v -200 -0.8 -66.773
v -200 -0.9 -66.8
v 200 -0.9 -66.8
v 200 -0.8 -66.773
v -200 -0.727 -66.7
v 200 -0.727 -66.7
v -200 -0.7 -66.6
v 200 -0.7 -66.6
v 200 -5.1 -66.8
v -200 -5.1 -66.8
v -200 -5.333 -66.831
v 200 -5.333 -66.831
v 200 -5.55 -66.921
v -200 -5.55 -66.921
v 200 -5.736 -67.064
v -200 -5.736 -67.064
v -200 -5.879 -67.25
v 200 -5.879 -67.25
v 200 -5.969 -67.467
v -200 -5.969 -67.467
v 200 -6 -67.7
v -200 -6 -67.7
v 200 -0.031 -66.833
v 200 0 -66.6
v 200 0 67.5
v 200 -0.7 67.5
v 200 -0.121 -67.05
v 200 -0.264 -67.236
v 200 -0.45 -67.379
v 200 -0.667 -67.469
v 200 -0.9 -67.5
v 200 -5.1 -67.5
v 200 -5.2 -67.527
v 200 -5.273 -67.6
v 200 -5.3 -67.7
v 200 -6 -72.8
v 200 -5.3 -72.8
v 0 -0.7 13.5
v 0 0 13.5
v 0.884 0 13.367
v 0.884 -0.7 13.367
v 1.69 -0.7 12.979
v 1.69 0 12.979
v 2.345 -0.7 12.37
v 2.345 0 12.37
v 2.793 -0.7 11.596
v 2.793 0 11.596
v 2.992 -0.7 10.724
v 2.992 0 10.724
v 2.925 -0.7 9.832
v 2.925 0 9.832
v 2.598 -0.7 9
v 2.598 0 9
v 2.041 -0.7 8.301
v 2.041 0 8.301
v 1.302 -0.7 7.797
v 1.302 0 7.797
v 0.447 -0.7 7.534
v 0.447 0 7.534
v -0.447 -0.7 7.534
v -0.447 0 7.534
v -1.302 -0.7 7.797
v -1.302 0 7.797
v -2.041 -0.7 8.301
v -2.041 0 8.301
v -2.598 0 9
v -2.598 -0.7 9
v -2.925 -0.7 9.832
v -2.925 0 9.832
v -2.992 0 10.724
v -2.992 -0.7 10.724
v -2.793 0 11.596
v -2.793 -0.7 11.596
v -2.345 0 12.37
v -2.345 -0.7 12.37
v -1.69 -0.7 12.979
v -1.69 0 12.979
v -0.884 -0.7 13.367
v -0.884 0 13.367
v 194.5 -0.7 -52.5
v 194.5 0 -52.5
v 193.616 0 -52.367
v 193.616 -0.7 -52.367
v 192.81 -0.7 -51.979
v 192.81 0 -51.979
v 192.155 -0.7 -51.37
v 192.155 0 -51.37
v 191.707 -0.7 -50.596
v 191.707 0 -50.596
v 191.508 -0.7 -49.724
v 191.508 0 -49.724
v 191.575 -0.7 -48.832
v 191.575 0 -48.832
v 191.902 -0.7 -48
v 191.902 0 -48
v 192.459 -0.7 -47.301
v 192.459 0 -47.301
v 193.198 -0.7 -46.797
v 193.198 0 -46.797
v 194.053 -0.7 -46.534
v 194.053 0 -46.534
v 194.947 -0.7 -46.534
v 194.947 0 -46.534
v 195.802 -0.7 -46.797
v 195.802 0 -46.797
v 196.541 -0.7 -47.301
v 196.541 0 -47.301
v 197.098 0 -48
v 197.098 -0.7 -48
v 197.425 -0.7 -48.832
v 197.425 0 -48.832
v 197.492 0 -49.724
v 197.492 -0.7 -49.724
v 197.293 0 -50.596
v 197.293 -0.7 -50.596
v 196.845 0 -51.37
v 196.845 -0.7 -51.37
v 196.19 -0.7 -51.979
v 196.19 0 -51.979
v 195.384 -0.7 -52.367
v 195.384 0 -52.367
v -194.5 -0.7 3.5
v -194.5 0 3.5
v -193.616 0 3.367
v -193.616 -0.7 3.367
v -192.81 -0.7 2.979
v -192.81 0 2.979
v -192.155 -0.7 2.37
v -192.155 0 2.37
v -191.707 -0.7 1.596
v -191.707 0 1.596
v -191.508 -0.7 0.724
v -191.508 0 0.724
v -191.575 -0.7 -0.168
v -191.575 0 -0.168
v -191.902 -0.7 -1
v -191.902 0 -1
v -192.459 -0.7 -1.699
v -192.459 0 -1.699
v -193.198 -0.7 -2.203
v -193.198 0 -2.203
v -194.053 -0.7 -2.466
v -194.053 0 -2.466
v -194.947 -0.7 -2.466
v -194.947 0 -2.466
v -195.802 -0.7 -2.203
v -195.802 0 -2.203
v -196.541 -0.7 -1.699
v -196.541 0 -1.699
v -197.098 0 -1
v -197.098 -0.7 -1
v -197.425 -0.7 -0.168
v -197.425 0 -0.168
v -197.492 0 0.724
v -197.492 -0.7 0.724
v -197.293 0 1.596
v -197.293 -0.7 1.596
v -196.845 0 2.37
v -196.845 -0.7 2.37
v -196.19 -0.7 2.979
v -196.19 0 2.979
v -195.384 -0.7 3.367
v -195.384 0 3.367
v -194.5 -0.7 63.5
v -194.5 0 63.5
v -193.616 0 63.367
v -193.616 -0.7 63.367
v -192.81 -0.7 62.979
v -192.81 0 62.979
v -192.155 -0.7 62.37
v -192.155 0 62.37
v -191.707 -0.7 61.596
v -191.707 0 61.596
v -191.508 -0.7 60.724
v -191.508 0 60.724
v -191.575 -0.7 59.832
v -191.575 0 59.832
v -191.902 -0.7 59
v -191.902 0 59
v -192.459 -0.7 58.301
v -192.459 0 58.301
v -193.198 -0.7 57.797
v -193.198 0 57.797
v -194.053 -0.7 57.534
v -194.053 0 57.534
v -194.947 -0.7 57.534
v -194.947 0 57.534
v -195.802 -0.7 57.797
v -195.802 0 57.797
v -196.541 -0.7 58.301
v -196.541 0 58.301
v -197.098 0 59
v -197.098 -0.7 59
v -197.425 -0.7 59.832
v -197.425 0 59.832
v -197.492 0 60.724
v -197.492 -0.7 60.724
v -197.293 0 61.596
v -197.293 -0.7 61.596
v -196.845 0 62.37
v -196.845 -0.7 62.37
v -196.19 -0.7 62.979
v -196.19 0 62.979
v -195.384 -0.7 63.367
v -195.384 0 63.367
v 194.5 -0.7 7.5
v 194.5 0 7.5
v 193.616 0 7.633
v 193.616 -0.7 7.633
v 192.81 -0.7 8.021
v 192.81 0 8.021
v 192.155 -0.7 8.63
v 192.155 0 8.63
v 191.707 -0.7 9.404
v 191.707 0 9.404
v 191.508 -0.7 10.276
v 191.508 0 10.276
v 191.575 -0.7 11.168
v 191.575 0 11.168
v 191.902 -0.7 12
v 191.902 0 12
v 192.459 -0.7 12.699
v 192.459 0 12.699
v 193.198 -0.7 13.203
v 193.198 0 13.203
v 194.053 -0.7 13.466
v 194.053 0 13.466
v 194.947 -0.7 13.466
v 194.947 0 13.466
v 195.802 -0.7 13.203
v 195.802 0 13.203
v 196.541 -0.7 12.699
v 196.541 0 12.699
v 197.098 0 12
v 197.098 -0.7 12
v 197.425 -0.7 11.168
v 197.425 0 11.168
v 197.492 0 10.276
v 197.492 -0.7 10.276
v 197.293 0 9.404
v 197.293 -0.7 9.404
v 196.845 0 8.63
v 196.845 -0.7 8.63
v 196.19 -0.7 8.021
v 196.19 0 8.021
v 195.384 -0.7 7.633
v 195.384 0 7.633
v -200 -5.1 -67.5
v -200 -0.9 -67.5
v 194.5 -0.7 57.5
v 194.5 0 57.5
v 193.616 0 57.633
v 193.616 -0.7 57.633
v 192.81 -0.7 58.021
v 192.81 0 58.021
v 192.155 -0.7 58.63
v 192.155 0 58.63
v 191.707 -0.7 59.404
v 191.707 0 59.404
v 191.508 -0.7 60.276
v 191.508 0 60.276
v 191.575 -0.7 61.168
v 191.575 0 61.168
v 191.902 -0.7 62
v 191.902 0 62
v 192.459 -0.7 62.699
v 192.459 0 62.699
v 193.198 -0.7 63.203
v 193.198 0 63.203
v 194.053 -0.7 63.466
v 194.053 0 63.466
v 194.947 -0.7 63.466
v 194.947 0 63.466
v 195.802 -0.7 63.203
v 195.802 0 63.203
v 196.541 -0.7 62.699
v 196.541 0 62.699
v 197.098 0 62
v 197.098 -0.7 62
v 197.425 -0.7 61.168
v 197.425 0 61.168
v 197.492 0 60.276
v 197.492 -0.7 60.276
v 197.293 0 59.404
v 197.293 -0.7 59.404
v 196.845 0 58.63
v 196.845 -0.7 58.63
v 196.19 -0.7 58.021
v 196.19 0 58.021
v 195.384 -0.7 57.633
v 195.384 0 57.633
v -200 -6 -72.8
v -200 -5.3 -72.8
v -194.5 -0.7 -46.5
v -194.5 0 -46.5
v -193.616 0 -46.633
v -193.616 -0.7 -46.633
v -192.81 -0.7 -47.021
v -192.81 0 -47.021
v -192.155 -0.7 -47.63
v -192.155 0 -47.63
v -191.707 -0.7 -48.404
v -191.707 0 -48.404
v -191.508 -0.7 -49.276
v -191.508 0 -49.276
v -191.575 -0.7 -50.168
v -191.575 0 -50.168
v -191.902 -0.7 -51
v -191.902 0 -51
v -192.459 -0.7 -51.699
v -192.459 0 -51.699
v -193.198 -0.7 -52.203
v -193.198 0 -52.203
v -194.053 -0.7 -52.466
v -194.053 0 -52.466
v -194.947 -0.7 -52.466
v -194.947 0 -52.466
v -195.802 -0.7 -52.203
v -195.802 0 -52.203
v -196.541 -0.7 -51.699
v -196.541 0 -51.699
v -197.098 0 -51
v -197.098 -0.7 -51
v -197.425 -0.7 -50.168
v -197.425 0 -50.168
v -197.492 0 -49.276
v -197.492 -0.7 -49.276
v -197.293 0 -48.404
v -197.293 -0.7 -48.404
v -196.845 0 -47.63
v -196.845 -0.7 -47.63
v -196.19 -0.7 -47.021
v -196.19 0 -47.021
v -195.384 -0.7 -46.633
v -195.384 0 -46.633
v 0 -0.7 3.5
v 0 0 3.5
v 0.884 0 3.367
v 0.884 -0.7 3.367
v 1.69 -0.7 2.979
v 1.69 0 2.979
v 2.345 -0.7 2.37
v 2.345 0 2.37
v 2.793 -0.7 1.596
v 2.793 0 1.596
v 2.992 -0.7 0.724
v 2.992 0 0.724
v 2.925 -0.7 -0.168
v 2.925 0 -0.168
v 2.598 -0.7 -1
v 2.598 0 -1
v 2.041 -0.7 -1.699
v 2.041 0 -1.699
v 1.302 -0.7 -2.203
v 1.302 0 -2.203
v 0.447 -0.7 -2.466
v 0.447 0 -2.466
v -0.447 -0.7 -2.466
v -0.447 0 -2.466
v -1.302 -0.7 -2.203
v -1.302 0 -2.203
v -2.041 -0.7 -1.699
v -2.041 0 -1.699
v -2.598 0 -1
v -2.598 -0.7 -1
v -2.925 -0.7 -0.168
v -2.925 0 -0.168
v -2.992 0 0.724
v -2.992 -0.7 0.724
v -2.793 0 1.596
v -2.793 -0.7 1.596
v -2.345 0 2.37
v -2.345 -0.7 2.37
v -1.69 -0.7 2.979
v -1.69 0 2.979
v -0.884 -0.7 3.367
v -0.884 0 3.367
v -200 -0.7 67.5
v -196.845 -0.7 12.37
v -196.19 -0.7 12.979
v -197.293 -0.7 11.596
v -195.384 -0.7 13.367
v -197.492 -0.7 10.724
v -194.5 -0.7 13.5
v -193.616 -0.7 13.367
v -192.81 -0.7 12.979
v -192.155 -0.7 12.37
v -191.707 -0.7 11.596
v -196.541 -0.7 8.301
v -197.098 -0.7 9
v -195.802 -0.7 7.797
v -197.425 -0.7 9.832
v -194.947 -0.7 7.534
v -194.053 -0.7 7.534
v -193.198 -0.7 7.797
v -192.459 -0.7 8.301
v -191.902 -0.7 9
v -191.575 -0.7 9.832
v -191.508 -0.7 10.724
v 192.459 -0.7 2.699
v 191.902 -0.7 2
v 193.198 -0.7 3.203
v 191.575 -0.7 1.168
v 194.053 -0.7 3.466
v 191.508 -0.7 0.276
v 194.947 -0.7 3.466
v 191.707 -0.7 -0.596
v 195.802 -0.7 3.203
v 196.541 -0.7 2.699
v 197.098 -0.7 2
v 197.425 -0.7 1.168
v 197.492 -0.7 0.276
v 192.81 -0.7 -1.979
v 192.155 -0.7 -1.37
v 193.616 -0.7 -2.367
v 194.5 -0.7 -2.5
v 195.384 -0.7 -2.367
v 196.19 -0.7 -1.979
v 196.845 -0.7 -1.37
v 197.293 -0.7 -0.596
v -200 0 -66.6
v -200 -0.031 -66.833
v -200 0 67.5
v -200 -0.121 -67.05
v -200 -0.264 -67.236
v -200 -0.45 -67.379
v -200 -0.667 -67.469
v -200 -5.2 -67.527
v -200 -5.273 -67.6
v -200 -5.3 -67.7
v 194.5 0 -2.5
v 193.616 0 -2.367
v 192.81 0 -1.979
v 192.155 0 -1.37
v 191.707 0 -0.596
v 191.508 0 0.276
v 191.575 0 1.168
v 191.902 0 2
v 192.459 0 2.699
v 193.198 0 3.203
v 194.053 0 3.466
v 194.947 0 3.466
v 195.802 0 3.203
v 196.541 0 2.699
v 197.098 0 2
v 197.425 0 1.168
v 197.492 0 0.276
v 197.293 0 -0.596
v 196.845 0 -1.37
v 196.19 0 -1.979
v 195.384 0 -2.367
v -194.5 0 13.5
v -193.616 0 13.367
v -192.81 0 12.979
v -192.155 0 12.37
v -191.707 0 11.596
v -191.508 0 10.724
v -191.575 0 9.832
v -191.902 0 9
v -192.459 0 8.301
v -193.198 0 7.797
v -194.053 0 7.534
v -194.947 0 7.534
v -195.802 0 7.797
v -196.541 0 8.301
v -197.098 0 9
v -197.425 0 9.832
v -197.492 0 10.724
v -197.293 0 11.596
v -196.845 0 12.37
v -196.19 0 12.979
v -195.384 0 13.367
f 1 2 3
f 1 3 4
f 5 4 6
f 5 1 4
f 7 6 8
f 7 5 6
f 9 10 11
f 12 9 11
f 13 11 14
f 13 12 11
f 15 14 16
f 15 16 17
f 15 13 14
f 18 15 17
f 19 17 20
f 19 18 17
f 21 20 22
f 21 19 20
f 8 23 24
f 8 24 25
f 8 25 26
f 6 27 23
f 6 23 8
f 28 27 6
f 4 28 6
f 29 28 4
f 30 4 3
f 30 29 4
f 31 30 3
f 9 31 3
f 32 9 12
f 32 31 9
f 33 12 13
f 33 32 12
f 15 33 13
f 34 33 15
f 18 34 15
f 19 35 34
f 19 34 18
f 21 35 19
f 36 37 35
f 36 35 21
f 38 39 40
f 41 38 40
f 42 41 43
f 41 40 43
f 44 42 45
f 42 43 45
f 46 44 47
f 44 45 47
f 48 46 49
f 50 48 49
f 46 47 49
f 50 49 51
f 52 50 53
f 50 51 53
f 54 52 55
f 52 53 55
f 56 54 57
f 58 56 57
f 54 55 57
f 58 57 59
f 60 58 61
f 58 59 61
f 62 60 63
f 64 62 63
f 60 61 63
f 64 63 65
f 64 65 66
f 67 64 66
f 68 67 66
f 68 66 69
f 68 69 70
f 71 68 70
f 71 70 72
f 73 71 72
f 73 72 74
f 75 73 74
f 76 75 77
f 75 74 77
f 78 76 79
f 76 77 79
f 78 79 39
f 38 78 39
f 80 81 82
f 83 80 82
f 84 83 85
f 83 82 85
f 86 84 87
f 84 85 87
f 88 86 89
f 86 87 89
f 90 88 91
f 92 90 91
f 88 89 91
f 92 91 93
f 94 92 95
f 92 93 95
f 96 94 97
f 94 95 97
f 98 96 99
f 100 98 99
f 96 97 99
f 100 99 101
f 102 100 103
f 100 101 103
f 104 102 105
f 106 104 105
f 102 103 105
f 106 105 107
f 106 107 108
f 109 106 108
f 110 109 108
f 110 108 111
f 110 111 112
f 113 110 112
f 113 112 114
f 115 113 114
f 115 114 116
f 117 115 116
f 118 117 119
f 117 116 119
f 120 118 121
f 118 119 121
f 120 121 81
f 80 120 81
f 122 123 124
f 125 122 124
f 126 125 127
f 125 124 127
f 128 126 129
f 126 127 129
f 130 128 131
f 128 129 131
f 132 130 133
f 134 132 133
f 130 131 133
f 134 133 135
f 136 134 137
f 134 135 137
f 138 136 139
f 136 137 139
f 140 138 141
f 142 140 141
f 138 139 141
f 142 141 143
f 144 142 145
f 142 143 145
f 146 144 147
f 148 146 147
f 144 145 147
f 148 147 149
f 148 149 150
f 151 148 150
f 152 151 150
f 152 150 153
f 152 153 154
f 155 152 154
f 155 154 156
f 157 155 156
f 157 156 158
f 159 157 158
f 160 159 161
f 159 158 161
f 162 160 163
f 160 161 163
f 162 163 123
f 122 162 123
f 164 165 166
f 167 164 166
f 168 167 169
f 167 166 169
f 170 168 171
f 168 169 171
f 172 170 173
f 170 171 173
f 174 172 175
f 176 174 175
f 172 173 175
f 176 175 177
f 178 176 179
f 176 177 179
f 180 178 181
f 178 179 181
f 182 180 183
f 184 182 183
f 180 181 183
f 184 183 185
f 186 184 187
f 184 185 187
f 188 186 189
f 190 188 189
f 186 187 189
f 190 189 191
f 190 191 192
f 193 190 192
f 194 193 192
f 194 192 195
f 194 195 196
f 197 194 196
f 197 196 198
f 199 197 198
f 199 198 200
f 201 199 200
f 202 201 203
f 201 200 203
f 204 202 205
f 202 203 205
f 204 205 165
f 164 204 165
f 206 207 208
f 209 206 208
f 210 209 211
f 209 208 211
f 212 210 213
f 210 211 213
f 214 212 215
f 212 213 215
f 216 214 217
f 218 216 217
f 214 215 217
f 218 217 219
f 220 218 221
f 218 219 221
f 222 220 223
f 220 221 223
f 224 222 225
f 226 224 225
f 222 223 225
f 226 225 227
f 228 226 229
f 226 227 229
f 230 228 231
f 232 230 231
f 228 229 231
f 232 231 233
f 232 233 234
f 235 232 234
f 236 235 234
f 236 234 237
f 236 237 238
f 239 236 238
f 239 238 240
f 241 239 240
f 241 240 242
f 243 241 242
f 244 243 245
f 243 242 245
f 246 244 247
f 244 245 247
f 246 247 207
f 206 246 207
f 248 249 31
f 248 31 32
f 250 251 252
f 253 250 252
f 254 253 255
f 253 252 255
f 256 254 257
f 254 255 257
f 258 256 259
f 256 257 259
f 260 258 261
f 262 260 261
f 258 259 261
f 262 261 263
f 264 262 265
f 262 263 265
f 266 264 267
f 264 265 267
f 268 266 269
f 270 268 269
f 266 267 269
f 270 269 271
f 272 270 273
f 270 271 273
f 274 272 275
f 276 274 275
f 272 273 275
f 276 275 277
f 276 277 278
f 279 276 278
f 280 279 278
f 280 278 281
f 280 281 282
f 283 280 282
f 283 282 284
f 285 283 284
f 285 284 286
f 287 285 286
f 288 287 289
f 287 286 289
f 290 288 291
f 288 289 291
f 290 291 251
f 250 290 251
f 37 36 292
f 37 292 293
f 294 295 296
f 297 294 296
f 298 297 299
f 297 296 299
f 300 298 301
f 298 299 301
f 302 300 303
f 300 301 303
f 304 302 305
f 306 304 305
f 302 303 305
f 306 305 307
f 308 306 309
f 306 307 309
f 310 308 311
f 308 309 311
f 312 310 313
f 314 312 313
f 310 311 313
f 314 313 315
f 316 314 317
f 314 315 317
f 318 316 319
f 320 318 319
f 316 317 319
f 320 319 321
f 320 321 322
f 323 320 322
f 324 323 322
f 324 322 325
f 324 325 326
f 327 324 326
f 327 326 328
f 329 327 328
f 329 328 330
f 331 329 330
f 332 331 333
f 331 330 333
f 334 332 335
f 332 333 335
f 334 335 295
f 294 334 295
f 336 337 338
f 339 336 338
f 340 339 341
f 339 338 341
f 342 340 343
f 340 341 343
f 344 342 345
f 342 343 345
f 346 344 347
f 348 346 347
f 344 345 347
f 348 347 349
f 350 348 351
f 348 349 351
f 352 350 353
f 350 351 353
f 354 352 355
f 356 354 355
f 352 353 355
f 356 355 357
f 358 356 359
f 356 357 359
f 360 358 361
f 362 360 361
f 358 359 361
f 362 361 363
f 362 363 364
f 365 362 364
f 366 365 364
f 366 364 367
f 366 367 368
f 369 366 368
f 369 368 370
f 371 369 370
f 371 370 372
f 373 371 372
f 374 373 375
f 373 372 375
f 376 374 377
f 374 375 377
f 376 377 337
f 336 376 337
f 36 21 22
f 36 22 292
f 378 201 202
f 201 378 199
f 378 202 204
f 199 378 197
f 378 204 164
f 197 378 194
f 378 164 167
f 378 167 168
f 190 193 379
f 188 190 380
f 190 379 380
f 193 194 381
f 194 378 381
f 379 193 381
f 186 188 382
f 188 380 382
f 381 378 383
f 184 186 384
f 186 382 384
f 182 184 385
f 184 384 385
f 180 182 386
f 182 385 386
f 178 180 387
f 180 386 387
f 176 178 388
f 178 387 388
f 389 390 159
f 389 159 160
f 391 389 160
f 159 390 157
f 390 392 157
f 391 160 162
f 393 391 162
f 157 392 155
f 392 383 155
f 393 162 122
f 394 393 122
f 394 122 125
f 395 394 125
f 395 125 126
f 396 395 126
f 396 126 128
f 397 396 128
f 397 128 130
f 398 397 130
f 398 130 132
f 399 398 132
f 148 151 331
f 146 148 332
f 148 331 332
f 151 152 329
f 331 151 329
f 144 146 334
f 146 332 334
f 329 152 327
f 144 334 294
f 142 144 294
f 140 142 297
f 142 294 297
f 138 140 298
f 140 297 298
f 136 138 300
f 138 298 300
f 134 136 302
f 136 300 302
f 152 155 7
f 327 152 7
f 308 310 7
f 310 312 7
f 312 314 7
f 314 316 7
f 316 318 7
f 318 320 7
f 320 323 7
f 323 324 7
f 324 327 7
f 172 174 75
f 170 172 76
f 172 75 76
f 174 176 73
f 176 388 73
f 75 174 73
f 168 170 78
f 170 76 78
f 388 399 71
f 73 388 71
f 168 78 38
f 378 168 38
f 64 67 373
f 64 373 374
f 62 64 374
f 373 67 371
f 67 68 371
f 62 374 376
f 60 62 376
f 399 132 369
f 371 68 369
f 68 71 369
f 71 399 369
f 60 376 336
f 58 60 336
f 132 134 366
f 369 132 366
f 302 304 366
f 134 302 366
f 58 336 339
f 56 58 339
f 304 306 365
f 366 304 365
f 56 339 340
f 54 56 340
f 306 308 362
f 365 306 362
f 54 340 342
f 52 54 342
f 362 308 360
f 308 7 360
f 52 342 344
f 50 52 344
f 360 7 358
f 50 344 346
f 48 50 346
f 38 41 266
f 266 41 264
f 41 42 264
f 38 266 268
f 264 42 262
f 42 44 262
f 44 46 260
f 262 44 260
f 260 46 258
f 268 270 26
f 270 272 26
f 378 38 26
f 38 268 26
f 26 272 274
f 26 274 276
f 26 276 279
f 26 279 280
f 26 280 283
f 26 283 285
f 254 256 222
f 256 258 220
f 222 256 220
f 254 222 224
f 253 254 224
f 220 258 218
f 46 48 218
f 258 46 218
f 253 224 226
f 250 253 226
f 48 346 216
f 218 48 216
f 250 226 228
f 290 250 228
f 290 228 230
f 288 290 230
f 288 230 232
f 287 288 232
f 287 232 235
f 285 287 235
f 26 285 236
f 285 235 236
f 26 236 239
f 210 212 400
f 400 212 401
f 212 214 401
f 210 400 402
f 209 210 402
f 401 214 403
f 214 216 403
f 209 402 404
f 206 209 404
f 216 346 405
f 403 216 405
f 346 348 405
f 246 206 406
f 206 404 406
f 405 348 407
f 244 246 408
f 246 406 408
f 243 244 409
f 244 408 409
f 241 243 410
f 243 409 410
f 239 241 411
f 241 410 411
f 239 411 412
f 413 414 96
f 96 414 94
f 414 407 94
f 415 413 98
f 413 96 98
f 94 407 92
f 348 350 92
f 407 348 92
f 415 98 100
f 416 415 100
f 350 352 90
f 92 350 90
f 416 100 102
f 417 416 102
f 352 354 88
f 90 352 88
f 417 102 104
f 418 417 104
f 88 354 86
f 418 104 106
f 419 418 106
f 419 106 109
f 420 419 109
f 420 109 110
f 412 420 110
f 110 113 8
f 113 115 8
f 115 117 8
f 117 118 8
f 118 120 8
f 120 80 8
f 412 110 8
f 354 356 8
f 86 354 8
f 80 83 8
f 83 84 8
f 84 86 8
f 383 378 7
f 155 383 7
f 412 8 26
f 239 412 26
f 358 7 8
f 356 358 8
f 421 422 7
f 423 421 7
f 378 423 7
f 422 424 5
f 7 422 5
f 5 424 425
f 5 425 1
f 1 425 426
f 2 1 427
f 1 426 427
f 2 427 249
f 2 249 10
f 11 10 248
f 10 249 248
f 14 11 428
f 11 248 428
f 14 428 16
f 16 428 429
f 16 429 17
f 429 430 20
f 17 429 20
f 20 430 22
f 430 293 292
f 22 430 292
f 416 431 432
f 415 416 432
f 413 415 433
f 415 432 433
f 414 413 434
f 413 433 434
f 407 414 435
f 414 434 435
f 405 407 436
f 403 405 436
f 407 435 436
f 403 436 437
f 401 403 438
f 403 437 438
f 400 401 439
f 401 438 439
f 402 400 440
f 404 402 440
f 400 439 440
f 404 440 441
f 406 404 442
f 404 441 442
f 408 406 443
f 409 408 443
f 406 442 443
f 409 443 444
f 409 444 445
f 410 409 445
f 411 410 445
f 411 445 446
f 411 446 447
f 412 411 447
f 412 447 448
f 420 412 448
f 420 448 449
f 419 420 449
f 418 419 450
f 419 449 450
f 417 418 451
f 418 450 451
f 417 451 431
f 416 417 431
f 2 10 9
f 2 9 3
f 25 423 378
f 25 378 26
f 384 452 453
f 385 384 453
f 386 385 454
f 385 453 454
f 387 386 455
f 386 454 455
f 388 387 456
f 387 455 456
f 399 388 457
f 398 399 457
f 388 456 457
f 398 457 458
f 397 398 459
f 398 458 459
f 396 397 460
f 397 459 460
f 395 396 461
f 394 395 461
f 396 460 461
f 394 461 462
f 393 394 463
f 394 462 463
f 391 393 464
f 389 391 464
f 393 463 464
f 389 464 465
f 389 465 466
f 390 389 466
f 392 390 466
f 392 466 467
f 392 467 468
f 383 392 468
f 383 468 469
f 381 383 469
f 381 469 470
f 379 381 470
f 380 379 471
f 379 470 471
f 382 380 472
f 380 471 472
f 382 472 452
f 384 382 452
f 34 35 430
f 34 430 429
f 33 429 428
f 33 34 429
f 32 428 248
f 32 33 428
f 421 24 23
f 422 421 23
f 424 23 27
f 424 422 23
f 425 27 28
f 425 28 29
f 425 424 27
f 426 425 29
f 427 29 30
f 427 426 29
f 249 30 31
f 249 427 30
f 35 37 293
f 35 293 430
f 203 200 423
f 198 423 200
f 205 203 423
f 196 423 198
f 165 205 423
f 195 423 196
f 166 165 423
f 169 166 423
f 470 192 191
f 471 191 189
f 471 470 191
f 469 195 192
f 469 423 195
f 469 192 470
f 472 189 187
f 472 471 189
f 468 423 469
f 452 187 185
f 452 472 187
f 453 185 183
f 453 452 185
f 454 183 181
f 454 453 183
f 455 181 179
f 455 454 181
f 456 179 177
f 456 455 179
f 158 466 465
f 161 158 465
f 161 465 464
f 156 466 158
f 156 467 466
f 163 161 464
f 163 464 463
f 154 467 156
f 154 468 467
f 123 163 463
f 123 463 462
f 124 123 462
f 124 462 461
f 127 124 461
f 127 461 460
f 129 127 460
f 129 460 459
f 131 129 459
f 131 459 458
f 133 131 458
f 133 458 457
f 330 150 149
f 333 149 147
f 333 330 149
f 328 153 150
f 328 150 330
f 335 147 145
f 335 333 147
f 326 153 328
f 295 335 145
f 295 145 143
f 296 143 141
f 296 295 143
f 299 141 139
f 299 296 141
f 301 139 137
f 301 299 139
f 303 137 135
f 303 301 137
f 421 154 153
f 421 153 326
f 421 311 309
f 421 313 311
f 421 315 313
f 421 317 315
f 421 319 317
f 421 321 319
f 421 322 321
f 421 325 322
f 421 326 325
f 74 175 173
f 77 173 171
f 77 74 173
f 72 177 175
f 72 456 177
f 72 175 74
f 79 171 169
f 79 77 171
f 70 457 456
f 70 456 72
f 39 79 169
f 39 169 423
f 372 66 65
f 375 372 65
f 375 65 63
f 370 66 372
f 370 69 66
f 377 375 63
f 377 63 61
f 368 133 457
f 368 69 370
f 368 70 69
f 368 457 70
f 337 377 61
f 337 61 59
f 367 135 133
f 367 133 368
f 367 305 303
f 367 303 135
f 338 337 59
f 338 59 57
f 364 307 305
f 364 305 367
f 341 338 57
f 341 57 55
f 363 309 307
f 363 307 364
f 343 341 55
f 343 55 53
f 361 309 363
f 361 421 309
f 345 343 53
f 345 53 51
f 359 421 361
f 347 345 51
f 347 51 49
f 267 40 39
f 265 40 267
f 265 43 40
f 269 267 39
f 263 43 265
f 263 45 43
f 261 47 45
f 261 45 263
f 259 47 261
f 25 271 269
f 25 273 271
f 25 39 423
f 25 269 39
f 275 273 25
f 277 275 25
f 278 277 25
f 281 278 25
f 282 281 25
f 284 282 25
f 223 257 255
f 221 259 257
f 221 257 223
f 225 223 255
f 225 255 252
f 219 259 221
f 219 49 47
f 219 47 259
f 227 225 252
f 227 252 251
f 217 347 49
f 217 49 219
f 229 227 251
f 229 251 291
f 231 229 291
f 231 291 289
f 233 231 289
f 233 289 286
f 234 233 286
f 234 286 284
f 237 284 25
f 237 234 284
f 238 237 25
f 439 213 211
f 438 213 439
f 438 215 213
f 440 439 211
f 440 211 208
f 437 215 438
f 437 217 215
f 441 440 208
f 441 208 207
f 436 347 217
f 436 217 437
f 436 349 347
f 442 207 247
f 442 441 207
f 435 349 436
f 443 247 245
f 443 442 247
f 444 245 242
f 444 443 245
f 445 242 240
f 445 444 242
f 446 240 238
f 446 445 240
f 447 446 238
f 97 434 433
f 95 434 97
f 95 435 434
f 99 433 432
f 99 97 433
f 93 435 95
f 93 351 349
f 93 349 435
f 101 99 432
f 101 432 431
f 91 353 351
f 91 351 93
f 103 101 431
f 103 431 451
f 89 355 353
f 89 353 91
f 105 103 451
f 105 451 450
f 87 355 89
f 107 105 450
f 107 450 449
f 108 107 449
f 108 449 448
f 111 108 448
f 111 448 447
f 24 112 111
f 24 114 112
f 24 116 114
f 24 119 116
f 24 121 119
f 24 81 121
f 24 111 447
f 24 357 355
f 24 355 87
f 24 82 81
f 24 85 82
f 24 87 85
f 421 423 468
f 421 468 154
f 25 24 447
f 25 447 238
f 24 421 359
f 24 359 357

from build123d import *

# Parameters (mm, degrees)
SKETCH_1_W                       = 400
SKETCH_1_H                       = 135
SKETCH_1_R                       = 3
SM_BASE_FLANGE_1_DEPTH           = 0.7
SM_EDGE_FLANGE_1_STRIP_W         = 3.2
SM_EDGE_FLANGE_1_STRIP_H         = 0.7
SM_EDGE_FLANGE_1_STRIP_CUT_DEPTH = 400
SM_EDGE_FLANGE_1_DEPTH           = 400
SM_EDGE_FLANGE_2_STRIP_W         = 3.2
SM_EDGE_FLANGE_2_STRIP_H         = 0.7
SM_EDGE_FLANGE_2_STRIP_CUT_DEPTH = 400
SM_EDGE_FLANGE_2_DEPTH           = 400


# Sheet-metal steps are written as plain solids
with BuildPart() as part:
    # Sketch 1 → 基体-法兰1 (new body)
    with BuildSketch(Plane(origin=(0, 0, 0), x_dir=(1, 0, 0), z_dir=(0, 1, 0))):
        Rectangle(SKETCH_1_W, SKETCH_1_H)
        with Locations(Location((-194.5, -60.5, 0), (0, 0, 270))):
            Circle(SKETCH_1_R, mode=Mode.SUBTRACT)
        with Locations(Location((-194.5, -10.5, 0), (0, 0, 270))):
            Circle(SKETCH_1_R, mode=Mode.SUBTRACT)
        with Locations(Location((-194.5, -0.5, 0), (0, 0, 270))):
            Circle(SKETCH_1_R, mode=Mode.SUBTRACT)
        with Locations(Location((-194.5, 49.5, 0), (0, 0, 270))):
            Circle(SKETCH_1_R, mode=Mode.SUBTRACT)
        with Locations(Location((0, -10.5, 0), (0, 0, 270))):
            Circle(SKETCH_1_R, mode=Mode.SUBTRACT)
        with Locations(Location((0, -0.5, 0), (0, 0, 270))):
            Circle(SKETCH_1_R, mode=Mode.SUBTRACT)
        with Locations(Location((194.5, -60.5, 0), (0, 0, 90))):
            Circle(SKETCH_1_R, mode=Mode.SUBTRACT)
        with Locations(Location((194.5, -10.5, 0), (0, 0, 90))):
            Circle(SKETCH_1_R, mode=Mode.SUBTRACT)
        with Locations(Location((194.5, -0.5, 0), (0, 0, 90))):
            Circle(SKETCH_1_R, mode=Mode.SUBTRACT)
        with Locations(Location((194.5, 49.5, 0), (0, 0, 90))):
            Circle(SKETCH_1_R, mode=Mode.SUBTRACT)
    extrude(amount=-SM_BASE_FLANGE_1_DEPTH)

    # 边线-法兰1 strip (across the edge) → 边线-法兰1 strip cut (cut)
    with BuildSketch(Plane(origin=(-200, -0.7, -67.5), x_dir=(0, 0, 1), z_dir=(1, 0, 0))):
        with Locations((-0.7, -0.35)):
            Rectangle(SM_EDGE_FLANGE_1_STRIP_W, SM_EDGE_FLANGE_1_STRIP_H)
    extrude(amount=SM_EDGE_FLANGE_1_STRIP_CUT_DEPTH, mode=Mode.SUBTRACT)

    # 边线-法兰1 section (across the edge) → 边线-法兰1 (add)
    with BuildSketch(Plane(origin=(-200, -0.7, -67.5), x_dir=(0, 0, 1), z_dir=(1, 0, 0))):
        with BuildLine():
            Line((0, 0.2), (0, 5.3))
            Line((0, 5.3), (0.7, 5.3))
            Line((0.7, 5.3), (0.7, 0.2))
            ThreePointArc((0.7, 0.2), (0.758578644, 0.058578644), (0.9, 0))
            Line((0.9, 0), (0.9, -0.7))
            ThreePointArc((0.9, -0.7), (0.263603897, -0.436396103), (0, 0.2))
        make_face()
    extrude(amount=SM_EDGE_FLANGE_1_DEPTH)

    # 边线-法兰2 strip (across the edge) → 边线-法兰2 strip cut (cut)
    with BuildSketch(Plane(origin=(200, -6, -67.5), x_dir=(0, 1, 0), z_dir=(-1, 0, 0))):
        with Locations((-0.7, -0.35)):
            Rectangle(SM_EDGE_FLANGE_2_STRIP_W, SM_EDGE_FLANGE_2_STRIP_H)
    extrude(amount=SM_EDGE_FLANGE_2_STRIP_CUT_DEPTH, mode=Mode.SUBTRACT)

    # 边线-法兰2 section (across the edge) → 边线-法兰2 (add)
    with BuildSketch(Plane(origin=(200, -6, -67.5), x_dir=(0, 1, 0), z_dir=(-1, 0, 0))):
        with BuildLine():
            Line((0, 0.2), (0, 5.3))
            Line((0, 5.3), (0.7, 5.3))
            Line((0.7, 5.3), (0.7, 0.2))
            ThreePointArc((0.7, 0.2), (0.758578644, 0.058578644), (0.9, 0))
            Line((0.9, 0), (0.9, -0.7))
            ThreePointArc((0.9, -0.7), (0.263603897, -0.436396103), (0, 0.2))
        make_face()
    extrude(amount=SM_EDGE_FLANGE_2_DEPTH)


solid = part.part
